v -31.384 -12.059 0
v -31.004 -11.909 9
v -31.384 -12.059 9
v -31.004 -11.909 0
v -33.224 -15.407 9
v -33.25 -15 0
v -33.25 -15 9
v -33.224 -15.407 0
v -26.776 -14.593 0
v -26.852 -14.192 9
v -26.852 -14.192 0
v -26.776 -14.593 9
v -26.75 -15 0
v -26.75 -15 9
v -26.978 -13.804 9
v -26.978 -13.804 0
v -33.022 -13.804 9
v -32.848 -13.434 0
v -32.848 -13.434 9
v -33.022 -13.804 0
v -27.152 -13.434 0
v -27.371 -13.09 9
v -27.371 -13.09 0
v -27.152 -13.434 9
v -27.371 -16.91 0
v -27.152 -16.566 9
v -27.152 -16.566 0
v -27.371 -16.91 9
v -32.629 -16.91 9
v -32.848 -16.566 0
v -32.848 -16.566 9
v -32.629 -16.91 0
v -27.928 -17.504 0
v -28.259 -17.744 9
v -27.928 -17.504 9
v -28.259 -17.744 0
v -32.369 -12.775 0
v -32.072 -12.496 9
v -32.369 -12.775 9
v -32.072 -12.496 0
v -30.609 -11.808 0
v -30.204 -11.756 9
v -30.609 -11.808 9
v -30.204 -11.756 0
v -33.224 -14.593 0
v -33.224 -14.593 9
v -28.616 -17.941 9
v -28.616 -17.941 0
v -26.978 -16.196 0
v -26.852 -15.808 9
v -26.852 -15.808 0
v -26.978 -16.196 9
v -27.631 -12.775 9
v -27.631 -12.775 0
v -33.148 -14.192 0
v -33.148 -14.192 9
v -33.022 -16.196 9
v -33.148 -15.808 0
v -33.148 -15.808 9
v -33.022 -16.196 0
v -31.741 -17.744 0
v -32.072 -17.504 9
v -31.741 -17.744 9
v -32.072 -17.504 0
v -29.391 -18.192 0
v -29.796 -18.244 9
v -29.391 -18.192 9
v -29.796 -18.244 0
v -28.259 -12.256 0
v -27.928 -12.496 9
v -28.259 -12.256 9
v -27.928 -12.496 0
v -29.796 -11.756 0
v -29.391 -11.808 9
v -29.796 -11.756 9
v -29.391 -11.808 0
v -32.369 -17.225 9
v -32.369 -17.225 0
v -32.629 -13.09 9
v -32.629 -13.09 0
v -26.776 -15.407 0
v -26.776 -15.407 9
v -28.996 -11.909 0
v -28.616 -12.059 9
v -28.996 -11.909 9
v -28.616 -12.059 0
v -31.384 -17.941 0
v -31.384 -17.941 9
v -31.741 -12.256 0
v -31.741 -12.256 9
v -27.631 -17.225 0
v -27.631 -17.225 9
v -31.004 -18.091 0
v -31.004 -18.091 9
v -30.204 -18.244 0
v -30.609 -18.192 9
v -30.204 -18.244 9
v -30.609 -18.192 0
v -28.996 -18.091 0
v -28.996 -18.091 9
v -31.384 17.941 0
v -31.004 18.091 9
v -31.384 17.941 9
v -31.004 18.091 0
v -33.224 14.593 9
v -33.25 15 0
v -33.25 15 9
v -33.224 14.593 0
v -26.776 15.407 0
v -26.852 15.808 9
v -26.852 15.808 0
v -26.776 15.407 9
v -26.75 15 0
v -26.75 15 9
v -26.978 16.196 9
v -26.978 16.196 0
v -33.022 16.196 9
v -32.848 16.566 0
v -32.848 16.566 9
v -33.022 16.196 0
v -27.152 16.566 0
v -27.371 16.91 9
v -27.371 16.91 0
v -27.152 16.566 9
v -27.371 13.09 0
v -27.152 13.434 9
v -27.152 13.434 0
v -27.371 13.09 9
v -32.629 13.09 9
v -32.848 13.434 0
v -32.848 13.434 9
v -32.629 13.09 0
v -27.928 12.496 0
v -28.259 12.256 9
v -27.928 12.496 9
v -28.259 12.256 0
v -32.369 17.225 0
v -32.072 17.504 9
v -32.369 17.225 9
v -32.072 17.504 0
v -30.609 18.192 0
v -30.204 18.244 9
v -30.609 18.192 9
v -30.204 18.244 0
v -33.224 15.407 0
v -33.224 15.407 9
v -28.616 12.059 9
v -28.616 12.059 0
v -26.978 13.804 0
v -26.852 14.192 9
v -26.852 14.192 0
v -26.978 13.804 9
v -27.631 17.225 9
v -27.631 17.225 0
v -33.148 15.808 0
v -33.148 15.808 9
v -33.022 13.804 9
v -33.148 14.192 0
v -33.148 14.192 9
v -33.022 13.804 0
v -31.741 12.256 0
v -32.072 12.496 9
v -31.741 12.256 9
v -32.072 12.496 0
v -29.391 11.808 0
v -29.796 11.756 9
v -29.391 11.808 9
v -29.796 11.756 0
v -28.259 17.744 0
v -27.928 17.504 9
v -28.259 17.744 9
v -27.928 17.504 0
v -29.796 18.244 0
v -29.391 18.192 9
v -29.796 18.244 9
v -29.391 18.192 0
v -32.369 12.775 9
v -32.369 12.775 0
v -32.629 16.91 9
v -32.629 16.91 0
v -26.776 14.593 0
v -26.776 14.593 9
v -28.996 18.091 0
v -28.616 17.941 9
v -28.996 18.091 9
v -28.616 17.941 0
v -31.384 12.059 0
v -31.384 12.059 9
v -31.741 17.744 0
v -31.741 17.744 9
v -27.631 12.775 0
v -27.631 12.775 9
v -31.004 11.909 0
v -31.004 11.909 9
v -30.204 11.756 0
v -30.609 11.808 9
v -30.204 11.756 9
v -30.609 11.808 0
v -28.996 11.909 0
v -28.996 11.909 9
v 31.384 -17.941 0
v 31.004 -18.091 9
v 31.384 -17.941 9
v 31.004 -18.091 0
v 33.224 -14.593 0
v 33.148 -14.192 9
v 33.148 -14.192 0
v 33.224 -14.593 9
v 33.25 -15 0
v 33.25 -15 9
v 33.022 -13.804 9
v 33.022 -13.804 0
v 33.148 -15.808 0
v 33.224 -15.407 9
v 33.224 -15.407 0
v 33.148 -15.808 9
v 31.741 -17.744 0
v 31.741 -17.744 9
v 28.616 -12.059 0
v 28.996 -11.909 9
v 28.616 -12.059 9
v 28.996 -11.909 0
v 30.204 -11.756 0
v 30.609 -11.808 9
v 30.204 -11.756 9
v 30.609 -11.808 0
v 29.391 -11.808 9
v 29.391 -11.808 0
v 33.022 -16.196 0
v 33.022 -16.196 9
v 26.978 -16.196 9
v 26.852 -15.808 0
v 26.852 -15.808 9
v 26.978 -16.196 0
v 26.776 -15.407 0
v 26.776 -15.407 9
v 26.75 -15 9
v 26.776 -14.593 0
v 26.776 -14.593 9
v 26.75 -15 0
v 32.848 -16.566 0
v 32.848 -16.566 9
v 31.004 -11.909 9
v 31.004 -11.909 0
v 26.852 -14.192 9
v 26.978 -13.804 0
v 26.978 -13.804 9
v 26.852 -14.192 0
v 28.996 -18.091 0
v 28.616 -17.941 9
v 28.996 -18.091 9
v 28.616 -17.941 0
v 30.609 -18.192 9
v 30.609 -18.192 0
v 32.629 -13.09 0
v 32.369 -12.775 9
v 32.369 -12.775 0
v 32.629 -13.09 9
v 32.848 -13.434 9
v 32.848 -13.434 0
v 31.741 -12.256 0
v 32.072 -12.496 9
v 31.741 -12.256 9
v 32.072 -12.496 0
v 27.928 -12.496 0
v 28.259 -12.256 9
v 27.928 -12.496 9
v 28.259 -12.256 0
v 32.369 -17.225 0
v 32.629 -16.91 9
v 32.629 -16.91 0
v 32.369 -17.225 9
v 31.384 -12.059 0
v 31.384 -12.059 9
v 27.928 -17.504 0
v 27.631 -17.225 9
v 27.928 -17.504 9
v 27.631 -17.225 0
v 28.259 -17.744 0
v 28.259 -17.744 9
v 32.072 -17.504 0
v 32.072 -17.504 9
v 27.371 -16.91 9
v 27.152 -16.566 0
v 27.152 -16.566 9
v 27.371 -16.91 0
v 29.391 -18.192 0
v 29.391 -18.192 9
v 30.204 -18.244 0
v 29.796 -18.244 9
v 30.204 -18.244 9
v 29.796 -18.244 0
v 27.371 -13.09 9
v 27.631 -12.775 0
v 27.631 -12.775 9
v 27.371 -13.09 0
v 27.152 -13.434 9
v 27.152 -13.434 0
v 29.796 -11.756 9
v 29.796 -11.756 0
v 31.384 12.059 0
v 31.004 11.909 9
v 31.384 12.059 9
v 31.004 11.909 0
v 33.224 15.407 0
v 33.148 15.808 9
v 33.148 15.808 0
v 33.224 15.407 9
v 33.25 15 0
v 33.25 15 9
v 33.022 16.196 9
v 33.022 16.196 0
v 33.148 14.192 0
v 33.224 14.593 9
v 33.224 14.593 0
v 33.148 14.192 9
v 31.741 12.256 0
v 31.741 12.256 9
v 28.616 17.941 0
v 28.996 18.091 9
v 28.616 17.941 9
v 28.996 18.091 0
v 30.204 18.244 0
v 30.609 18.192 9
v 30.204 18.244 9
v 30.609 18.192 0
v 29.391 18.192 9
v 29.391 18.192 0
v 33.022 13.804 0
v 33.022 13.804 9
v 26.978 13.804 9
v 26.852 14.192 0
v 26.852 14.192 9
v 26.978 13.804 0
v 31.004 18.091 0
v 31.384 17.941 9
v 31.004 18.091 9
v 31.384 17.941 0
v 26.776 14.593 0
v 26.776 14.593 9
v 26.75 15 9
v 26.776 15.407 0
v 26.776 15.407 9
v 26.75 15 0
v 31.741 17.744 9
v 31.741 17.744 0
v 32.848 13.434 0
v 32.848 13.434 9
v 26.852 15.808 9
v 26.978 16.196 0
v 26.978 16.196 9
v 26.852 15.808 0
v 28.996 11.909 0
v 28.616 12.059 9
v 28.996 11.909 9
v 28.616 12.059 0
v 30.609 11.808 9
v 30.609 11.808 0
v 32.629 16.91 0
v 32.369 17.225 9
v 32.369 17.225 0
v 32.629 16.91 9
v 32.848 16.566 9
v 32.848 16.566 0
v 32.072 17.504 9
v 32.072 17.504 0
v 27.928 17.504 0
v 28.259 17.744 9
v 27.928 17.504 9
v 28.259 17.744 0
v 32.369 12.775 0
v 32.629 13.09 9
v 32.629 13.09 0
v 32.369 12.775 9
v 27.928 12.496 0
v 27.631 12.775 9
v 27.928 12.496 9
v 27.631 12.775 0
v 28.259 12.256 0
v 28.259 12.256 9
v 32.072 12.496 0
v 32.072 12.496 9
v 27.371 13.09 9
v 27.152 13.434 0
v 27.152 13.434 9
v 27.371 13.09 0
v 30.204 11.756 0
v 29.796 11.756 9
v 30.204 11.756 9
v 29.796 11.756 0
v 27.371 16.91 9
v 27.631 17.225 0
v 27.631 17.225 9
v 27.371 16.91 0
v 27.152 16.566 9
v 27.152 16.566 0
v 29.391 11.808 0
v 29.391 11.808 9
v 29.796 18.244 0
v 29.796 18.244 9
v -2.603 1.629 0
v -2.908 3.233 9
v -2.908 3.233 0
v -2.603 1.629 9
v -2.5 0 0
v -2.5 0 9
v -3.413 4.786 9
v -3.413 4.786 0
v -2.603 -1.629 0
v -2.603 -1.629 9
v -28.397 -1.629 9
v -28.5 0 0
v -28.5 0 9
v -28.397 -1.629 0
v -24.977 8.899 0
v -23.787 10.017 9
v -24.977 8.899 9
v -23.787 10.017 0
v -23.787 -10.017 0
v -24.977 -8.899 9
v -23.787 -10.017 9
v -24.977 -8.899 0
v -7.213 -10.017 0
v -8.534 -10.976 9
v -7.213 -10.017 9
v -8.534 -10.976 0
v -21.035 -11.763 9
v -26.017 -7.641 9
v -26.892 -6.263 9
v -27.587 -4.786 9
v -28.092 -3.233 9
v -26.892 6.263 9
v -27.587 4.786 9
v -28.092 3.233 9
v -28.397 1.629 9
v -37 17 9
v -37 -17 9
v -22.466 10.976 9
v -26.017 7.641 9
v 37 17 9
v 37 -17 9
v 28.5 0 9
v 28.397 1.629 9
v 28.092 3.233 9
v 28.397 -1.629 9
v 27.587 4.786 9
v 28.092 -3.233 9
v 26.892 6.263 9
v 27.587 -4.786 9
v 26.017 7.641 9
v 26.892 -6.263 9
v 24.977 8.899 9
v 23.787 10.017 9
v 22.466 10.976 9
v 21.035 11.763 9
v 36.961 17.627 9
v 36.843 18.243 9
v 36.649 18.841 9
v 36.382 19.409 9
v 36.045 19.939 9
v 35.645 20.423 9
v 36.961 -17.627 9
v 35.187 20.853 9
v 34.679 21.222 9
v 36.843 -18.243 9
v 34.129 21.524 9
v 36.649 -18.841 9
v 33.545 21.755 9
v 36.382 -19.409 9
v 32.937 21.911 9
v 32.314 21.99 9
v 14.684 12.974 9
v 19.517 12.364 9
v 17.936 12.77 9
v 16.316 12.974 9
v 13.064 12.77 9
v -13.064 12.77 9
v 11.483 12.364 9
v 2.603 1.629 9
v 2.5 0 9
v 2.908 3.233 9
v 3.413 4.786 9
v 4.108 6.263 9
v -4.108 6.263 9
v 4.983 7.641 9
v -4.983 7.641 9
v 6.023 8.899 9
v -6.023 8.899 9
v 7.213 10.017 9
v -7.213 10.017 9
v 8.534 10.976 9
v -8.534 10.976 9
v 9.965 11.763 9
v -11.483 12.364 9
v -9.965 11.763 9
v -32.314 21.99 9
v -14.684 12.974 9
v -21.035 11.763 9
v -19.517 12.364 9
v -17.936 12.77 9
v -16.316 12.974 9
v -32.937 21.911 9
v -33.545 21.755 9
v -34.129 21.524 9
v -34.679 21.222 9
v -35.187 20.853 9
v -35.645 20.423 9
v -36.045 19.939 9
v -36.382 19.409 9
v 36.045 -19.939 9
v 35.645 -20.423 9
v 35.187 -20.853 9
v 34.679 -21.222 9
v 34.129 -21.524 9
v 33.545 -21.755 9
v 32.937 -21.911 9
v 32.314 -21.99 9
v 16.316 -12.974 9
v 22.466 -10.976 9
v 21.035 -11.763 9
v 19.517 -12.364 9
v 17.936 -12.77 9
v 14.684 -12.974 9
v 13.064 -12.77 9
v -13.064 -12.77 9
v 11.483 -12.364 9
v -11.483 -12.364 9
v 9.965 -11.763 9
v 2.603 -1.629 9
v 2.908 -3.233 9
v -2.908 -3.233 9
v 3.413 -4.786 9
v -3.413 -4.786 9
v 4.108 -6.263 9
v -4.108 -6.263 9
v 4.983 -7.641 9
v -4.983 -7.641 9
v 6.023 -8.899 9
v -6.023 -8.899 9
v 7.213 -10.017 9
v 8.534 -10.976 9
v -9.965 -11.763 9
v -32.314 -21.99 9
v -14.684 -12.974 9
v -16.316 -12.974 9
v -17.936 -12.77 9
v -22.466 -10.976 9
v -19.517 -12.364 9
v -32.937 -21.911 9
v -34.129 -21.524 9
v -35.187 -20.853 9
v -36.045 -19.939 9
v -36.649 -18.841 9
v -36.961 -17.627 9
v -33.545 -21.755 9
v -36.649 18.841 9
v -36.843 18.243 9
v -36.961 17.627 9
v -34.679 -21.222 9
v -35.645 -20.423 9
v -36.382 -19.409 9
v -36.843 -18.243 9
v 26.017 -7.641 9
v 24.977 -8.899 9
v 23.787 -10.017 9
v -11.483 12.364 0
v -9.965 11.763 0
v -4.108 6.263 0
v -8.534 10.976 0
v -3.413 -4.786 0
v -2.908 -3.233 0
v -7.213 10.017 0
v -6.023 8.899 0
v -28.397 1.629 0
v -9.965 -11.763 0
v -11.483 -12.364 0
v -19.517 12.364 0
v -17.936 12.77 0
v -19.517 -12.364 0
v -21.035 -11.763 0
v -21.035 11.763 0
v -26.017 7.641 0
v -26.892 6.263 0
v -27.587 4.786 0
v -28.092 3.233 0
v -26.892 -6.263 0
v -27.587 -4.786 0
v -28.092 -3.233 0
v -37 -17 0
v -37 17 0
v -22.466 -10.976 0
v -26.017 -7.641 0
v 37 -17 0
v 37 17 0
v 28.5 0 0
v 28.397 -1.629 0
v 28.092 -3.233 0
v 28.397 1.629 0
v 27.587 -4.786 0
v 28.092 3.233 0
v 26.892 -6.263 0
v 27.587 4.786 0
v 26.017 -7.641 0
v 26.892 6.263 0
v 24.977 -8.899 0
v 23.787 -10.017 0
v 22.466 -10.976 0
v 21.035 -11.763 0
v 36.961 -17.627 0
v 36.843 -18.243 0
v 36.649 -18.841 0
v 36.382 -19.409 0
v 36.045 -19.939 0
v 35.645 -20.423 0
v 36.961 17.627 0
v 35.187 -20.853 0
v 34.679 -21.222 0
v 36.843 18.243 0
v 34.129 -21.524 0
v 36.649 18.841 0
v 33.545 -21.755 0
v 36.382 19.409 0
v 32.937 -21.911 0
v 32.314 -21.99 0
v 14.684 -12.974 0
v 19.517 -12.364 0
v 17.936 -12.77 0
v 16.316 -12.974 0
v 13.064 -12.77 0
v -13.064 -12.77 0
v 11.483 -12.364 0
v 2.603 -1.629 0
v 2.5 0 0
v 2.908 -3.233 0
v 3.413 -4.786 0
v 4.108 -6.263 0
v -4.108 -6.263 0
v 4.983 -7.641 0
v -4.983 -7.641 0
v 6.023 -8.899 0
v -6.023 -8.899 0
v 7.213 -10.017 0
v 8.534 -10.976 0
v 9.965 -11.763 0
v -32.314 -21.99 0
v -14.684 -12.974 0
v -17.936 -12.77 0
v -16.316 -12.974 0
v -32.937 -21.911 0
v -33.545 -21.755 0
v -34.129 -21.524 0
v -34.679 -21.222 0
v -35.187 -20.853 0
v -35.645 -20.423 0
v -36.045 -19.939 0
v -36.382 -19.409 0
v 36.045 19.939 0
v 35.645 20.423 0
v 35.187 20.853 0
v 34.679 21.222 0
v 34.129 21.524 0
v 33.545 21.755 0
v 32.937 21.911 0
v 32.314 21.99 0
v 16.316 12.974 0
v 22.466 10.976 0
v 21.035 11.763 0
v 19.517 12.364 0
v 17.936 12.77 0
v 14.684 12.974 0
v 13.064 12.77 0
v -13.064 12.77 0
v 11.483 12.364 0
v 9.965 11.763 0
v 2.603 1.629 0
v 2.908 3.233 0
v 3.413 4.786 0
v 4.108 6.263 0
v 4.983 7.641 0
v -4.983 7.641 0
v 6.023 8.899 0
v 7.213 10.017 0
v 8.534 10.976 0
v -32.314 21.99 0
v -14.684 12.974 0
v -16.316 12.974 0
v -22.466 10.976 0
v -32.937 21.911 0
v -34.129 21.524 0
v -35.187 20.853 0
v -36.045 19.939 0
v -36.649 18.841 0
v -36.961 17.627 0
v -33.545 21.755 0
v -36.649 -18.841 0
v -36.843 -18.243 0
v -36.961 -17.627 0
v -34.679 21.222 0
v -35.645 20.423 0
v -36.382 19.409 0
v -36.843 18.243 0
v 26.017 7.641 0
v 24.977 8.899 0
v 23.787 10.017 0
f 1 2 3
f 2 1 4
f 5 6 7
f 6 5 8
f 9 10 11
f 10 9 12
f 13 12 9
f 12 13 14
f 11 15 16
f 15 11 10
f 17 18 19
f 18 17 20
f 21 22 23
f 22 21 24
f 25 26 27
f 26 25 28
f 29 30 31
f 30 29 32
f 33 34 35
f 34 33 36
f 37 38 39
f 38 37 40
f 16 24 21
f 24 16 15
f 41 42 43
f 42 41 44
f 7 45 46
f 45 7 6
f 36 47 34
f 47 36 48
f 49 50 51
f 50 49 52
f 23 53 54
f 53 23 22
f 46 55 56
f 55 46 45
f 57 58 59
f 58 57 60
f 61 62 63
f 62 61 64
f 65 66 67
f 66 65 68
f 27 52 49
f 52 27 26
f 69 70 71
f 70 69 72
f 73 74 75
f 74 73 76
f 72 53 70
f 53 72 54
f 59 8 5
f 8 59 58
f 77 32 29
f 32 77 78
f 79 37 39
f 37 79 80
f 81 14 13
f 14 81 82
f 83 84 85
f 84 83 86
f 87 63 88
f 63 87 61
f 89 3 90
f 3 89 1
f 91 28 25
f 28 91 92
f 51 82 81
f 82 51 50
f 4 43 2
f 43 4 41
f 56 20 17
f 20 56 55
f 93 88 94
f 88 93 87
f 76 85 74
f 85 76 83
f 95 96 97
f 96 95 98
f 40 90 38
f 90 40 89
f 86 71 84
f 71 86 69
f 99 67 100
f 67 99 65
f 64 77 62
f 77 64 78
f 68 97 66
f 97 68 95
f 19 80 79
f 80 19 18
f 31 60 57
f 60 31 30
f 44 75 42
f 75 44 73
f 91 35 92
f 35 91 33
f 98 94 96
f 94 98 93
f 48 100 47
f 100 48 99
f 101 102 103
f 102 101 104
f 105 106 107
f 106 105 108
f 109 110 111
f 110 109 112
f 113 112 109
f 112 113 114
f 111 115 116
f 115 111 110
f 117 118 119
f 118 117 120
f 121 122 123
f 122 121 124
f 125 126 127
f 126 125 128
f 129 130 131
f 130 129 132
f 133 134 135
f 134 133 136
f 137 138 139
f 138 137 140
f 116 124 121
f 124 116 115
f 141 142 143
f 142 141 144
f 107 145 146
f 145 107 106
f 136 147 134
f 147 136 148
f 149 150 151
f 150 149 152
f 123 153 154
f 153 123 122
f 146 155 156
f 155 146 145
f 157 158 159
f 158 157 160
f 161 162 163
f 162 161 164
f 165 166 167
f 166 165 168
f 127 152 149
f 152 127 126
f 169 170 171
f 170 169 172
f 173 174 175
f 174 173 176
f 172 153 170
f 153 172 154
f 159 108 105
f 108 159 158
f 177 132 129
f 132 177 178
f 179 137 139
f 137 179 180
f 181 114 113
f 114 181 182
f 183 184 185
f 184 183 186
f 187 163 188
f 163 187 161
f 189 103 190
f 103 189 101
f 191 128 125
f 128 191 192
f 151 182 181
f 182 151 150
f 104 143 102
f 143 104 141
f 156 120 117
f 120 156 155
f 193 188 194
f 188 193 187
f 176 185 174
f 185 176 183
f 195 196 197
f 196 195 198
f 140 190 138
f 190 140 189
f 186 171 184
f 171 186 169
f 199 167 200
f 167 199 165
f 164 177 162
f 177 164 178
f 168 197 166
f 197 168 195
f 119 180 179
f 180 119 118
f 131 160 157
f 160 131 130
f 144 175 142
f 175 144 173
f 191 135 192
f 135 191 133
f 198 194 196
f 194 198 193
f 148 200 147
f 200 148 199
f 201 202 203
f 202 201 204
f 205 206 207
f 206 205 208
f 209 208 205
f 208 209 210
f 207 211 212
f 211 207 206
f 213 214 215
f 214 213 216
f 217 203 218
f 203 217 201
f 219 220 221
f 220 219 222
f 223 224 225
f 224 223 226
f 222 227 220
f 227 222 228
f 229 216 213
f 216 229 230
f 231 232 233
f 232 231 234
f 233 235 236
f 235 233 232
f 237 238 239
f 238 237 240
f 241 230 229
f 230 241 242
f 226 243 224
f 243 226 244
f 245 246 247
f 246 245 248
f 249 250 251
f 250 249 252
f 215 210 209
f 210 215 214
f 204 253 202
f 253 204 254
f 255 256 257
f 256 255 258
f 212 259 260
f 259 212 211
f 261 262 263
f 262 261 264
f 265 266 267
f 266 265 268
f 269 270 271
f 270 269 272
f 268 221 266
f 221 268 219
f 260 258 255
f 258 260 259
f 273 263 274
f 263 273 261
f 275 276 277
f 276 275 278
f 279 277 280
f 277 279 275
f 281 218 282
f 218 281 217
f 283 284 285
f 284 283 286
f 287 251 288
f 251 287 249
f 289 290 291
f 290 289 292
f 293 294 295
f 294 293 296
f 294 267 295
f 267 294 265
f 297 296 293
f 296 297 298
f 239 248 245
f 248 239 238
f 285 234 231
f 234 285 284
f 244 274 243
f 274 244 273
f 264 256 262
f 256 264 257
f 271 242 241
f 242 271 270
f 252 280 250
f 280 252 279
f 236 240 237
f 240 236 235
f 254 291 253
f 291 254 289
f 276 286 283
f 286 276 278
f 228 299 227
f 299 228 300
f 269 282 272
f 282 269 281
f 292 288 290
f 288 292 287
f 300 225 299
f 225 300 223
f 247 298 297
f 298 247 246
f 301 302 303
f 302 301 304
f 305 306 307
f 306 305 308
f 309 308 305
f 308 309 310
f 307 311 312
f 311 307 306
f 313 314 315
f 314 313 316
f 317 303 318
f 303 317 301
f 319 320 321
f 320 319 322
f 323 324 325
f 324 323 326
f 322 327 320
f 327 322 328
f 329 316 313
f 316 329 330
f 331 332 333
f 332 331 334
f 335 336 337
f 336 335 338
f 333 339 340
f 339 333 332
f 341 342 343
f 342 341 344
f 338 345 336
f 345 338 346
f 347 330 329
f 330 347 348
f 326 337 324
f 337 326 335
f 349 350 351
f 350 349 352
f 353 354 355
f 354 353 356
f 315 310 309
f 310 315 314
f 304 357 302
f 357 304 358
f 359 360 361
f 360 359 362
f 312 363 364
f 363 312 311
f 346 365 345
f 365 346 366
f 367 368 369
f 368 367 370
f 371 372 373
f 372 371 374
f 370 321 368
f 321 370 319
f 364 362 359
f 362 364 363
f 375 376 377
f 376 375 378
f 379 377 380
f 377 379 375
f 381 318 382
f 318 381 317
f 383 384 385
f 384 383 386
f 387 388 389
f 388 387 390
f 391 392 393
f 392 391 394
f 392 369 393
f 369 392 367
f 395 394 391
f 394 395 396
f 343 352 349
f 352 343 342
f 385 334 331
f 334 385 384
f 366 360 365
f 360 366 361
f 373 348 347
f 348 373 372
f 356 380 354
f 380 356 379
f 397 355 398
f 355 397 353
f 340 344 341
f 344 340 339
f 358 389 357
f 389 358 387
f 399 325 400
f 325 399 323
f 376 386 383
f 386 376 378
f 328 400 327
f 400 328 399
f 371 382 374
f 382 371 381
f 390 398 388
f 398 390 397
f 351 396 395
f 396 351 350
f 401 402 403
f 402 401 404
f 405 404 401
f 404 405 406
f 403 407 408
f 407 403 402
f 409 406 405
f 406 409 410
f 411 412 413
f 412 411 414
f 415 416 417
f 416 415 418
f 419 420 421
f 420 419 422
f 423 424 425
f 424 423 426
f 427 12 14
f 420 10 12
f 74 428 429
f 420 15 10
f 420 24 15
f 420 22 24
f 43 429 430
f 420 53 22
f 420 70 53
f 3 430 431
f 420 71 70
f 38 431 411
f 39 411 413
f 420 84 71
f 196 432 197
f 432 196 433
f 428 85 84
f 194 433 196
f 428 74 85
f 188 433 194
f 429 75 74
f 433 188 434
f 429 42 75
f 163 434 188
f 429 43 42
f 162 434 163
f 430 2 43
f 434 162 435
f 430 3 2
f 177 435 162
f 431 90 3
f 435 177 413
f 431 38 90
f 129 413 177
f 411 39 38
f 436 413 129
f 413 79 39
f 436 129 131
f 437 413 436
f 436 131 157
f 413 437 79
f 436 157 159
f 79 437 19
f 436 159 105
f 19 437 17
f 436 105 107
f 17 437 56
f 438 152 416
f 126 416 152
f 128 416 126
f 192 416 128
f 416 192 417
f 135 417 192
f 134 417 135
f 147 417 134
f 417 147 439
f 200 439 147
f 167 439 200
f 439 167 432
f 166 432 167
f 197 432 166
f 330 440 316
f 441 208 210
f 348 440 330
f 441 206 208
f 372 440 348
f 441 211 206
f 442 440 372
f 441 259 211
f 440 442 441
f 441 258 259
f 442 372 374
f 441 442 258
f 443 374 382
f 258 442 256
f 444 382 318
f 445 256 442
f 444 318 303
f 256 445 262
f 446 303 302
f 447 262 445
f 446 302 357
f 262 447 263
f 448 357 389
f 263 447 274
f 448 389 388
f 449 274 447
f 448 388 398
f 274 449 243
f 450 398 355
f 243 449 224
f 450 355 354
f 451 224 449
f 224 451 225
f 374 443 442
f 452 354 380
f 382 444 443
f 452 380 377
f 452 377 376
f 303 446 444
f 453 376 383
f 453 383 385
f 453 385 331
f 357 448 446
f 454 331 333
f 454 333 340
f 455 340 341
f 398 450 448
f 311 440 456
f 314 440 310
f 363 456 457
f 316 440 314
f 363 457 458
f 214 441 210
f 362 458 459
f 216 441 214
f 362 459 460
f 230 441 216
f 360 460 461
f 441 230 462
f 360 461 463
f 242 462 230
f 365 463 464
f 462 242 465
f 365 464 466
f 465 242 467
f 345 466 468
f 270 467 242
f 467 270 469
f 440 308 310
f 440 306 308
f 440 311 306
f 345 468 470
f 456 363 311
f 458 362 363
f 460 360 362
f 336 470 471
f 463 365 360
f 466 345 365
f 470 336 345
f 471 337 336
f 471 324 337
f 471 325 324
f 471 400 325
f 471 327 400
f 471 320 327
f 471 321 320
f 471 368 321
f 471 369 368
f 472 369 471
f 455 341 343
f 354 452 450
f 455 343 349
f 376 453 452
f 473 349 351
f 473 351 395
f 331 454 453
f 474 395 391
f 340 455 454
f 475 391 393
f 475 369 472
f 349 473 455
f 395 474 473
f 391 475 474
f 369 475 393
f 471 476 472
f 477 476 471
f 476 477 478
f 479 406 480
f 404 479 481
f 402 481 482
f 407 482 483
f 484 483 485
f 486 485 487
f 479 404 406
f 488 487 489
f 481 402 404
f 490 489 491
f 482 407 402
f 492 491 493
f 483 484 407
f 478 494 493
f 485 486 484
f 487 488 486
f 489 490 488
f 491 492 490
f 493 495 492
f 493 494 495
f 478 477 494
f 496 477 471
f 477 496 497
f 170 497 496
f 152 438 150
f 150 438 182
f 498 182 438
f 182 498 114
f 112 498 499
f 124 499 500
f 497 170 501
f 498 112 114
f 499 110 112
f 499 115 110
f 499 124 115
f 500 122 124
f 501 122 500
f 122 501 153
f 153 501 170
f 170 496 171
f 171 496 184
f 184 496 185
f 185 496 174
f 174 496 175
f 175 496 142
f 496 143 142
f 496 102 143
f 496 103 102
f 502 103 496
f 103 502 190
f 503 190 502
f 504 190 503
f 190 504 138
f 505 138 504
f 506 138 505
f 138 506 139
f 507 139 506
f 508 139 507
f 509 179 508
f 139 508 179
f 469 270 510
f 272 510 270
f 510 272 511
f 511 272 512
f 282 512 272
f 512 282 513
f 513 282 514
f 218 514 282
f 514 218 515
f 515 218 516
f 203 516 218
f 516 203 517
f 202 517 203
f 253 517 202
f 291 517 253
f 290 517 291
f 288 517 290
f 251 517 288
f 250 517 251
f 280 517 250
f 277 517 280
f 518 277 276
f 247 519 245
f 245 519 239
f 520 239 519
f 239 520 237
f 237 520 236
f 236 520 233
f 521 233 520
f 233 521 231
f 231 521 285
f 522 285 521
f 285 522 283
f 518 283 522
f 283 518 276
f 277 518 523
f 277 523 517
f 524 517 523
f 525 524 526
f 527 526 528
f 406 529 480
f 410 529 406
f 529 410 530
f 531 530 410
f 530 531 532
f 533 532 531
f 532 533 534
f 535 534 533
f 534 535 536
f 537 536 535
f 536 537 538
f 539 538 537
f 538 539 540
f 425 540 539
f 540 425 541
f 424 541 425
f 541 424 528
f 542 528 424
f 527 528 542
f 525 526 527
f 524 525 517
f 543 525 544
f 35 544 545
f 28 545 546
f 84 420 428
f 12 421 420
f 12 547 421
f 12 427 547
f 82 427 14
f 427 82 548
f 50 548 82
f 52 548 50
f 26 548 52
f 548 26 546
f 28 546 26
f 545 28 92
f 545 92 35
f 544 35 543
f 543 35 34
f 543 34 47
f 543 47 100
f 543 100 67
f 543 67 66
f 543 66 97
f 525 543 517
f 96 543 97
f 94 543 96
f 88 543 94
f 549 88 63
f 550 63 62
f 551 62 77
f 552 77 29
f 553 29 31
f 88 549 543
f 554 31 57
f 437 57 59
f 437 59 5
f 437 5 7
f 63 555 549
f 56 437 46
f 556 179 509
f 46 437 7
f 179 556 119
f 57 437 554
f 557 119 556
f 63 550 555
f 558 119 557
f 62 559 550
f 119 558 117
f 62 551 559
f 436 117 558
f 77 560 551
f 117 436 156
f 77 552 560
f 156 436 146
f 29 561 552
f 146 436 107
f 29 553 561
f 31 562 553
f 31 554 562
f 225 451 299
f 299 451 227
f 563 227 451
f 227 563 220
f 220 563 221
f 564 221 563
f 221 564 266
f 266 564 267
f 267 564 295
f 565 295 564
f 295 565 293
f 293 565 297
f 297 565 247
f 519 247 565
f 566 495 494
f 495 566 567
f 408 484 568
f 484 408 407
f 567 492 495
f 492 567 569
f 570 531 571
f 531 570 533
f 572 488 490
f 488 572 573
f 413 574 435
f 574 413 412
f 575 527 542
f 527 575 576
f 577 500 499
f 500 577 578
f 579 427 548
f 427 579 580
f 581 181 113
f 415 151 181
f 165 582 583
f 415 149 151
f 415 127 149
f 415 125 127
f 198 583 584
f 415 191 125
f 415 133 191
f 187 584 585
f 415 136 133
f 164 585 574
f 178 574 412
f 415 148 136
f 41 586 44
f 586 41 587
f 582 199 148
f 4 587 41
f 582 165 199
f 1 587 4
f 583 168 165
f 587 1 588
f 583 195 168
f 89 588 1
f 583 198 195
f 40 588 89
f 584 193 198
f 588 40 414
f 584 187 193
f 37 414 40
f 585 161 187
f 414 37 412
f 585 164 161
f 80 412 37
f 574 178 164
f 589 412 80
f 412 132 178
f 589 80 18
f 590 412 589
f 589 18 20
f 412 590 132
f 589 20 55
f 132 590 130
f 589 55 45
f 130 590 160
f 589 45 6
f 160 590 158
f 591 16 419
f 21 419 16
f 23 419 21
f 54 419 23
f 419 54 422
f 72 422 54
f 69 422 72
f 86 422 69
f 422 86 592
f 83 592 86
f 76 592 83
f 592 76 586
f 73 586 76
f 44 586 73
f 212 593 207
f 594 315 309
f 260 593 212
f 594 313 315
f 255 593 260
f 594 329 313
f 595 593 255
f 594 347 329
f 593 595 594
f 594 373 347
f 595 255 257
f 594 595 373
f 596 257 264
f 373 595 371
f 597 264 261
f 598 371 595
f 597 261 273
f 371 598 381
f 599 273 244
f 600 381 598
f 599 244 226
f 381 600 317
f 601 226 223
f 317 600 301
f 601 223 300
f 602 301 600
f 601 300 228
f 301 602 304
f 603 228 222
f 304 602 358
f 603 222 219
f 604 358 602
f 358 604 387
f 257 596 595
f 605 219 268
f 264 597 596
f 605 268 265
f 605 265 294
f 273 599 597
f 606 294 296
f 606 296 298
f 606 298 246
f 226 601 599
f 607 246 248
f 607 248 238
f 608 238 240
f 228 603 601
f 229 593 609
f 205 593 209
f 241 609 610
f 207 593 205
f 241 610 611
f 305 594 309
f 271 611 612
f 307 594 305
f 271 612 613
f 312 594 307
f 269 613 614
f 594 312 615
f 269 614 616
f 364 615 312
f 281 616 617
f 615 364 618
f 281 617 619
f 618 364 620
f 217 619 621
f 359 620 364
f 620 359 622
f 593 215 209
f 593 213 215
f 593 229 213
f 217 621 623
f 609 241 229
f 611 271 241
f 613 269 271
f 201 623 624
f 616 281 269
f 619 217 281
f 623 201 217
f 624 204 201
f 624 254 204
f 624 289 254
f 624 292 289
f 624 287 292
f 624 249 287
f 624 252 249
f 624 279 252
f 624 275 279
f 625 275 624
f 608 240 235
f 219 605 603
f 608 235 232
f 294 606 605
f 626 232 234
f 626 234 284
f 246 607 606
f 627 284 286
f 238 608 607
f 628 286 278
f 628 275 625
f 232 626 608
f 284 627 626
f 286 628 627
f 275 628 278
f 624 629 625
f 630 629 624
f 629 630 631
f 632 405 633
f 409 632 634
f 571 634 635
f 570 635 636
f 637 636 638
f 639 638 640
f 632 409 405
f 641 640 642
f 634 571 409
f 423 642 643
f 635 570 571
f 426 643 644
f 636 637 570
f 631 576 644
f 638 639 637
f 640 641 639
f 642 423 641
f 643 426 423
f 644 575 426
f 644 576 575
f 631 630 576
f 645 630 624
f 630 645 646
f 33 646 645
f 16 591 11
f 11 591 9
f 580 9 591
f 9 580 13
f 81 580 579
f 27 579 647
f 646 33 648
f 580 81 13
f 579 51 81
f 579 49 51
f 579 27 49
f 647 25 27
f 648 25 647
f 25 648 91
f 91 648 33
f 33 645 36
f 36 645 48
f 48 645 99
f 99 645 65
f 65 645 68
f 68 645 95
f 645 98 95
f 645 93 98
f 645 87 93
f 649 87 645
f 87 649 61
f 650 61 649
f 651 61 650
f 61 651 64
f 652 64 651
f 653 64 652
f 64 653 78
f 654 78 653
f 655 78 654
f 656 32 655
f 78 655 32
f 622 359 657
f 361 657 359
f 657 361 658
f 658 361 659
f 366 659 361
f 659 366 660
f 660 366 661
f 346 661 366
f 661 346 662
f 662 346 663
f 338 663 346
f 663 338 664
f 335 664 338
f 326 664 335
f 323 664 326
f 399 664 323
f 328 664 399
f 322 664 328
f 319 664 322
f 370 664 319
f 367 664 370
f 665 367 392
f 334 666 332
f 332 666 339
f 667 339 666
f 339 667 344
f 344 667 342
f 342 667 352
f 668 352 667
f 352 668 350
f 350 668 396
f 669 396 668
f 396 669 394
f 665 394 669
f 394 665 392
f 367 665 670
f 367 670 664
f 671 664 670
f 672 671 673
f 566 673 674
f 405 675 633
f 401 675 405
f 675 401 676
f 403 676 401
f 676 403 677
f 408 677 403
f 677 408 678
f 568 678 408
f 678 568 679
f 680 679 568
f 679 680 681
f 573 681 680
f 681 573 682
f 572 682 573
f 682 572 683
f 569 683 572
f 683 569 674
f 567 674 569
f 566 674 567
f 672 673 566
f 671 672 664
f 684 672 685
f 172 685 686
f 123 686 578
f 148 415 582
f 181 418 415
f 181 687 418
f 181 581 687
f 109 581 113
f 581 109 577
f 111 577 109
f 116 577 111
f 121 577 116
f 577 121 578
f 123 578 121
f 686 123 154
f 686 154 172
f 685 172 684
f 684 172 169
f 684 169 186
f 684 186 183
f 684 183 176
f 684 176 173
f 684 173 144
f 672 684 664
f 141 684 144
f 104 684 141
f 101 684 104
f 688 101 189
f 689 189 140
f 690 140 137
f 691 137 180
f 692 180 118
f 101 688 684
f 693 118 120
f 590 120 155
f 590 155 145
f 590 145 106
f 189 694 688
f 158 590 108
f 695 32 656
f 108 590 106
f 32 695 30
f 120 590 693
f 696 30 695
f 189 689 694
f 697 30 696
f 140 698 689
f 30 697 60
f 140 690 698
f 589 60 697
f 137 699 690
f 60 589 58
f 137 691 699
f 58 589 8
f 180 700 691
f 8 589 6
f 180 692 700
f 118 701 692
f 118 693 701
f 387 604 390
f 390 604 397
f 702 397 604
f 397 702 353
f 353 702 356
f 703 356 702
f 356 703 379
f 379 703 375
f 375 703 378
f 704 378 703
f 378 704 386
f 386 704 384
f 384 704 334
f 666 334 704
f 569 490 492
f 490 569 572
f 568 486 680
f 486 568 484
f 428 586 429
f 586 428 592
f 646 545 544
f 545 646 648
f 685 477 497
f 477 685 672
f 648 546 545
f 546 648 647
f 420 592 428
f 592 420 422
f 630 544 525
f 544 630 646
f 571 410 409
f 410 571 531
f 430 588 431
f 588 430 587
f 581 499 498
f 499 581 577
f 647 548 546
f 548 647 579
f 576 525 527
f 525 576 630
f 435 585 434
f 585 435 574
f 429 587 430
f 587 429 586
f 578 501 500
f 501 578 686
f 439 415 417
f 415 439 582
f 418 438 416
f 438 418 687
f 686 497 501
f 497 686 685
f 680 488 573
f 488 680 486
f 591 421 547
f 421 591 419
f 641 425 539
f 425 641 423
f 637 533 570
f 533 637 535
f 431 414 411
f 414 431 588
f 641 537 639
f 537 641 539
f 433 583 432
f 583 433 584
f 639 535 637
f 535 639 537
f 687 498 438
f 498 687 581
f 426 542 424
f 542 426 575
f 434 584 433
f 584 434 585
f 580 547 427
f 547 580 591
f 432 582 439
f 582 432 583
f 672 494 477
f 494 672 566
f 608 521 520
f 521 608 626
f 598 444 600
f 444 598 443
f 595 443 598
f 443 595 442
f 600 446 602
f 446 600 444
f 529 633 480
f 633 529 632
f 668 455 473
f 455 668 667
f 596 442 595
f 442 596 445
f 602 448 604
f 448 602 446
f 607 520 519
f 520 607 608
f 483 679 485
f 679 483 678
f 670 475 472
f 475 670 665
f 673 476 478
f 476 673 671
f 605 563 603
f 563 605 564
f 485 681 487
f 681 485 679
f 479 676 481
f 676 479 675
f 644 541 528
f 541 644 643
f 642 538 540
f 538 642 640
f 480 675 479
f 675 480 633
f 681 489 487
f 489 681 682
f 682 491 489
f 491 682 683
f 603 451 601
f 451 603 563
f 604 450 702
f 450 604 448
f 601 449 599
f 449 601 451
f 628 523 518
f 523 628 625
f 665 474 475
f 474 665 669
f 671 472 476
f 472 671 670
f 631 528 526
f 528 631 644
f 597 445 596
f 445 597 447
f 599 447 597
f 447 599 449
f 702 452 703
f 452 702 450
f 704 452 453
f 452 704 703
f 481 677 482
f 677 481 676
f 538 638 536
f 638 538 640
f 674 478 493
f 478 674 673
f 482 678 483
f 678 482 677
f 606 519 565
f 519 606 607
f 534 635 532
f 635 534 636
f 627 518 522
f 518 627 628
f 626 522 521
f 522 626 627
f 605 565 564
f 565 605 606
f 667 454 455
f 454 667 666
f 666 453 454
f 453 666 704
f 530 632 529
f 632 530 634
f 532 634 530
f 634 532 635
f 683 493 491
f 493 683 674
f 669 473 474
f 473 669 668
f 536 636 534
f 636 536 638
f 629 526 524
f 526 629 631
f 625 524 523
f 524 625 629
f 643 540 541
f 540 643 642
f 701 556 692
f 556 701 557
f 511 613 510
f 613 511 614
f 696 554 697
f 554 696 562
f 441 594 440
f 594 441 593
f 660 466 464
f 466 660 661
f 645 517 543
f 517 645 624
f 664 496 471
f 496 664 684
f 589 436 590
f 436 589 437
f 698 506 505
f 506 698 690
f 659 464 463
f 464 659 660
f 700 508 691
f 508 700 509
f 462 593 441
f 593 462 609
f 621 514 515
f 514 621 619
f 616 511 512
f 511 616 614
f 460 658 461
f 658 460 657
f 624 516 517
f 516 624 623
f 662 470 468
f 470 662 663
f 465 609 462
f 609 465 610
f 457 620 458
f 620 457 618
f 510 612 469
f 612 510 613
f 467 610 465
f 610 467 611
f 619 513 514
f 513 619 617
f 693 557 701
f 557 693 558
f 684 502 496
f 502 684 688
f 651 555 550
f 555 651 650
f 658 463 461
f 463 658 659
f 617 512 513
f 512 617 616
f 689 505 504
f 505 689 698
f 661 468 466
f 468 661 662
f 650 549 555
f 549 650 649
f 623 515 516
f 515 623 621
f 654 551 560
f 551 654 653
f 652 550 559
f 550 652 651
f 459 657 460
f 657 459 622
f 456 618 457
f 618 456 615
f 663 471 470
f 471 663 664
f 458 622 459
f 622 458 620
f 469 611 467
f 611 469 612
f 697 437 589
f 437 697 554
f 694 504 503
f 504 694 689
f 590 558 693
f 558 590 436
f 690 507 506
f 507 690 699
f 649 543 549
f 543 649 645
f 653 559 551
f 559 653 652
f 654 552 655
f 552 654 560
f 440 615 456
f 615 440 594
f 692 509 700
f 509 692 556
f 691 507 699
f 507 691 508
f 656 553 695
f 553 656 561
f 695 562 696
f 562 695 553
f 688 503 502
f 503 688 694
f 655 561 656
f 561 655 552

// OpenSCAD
$fn = 50;


difference() {
	union() {
		hull() {
			translate(v = [-32.0000000000, 17.0000000000, 0]) {
				cylinder(h = 9, r = 5);
			}
			translate(v = [32.0000000000, 17.0000000000, 0]) {
				cylinder(h = 9, r = 5);
			}
			translate(v = [-32.0000000000, -17.0000000000, 0]) {
				cylinder(h = 9, r = 5);
			}
			translate(v = [32.0000000000, -17.0000000000, 0]) {
				cylinder(h = 9, r = 5);
			}
		}
	}
	union() {
		#translate(v = [-30.0000000000, -15.0000000000, -100.0000000000]) {
			cylinder(h = 200, r = 3.2500000000);
		}
		#translate(v = [-30.0000000000, 15.0000000000, -100.0000000000]) {
			cylinder(h = 200, r = 3.2500000000);
		}
		#translate(v = [30.0000000000, -15.0000000000, -100.0000000000]) {
			cylinder(h = 200, r = 3.2500000000);
		}
		#translate(v = [30.0000000000, 15.0000000000, -100.0000000000]) {
			cylinder(h = 200, r = 3.2500000000);
		}
		#translate(v = [-15.5000000000, 0, 0]) {
			cylinder(h = 9, r = 13.0000000000);
		}
		#translate(v = [15.5000000000, 0, 0]) {
			cylinder(h = 9, r = 13.0000000000);
		}
	}
}
